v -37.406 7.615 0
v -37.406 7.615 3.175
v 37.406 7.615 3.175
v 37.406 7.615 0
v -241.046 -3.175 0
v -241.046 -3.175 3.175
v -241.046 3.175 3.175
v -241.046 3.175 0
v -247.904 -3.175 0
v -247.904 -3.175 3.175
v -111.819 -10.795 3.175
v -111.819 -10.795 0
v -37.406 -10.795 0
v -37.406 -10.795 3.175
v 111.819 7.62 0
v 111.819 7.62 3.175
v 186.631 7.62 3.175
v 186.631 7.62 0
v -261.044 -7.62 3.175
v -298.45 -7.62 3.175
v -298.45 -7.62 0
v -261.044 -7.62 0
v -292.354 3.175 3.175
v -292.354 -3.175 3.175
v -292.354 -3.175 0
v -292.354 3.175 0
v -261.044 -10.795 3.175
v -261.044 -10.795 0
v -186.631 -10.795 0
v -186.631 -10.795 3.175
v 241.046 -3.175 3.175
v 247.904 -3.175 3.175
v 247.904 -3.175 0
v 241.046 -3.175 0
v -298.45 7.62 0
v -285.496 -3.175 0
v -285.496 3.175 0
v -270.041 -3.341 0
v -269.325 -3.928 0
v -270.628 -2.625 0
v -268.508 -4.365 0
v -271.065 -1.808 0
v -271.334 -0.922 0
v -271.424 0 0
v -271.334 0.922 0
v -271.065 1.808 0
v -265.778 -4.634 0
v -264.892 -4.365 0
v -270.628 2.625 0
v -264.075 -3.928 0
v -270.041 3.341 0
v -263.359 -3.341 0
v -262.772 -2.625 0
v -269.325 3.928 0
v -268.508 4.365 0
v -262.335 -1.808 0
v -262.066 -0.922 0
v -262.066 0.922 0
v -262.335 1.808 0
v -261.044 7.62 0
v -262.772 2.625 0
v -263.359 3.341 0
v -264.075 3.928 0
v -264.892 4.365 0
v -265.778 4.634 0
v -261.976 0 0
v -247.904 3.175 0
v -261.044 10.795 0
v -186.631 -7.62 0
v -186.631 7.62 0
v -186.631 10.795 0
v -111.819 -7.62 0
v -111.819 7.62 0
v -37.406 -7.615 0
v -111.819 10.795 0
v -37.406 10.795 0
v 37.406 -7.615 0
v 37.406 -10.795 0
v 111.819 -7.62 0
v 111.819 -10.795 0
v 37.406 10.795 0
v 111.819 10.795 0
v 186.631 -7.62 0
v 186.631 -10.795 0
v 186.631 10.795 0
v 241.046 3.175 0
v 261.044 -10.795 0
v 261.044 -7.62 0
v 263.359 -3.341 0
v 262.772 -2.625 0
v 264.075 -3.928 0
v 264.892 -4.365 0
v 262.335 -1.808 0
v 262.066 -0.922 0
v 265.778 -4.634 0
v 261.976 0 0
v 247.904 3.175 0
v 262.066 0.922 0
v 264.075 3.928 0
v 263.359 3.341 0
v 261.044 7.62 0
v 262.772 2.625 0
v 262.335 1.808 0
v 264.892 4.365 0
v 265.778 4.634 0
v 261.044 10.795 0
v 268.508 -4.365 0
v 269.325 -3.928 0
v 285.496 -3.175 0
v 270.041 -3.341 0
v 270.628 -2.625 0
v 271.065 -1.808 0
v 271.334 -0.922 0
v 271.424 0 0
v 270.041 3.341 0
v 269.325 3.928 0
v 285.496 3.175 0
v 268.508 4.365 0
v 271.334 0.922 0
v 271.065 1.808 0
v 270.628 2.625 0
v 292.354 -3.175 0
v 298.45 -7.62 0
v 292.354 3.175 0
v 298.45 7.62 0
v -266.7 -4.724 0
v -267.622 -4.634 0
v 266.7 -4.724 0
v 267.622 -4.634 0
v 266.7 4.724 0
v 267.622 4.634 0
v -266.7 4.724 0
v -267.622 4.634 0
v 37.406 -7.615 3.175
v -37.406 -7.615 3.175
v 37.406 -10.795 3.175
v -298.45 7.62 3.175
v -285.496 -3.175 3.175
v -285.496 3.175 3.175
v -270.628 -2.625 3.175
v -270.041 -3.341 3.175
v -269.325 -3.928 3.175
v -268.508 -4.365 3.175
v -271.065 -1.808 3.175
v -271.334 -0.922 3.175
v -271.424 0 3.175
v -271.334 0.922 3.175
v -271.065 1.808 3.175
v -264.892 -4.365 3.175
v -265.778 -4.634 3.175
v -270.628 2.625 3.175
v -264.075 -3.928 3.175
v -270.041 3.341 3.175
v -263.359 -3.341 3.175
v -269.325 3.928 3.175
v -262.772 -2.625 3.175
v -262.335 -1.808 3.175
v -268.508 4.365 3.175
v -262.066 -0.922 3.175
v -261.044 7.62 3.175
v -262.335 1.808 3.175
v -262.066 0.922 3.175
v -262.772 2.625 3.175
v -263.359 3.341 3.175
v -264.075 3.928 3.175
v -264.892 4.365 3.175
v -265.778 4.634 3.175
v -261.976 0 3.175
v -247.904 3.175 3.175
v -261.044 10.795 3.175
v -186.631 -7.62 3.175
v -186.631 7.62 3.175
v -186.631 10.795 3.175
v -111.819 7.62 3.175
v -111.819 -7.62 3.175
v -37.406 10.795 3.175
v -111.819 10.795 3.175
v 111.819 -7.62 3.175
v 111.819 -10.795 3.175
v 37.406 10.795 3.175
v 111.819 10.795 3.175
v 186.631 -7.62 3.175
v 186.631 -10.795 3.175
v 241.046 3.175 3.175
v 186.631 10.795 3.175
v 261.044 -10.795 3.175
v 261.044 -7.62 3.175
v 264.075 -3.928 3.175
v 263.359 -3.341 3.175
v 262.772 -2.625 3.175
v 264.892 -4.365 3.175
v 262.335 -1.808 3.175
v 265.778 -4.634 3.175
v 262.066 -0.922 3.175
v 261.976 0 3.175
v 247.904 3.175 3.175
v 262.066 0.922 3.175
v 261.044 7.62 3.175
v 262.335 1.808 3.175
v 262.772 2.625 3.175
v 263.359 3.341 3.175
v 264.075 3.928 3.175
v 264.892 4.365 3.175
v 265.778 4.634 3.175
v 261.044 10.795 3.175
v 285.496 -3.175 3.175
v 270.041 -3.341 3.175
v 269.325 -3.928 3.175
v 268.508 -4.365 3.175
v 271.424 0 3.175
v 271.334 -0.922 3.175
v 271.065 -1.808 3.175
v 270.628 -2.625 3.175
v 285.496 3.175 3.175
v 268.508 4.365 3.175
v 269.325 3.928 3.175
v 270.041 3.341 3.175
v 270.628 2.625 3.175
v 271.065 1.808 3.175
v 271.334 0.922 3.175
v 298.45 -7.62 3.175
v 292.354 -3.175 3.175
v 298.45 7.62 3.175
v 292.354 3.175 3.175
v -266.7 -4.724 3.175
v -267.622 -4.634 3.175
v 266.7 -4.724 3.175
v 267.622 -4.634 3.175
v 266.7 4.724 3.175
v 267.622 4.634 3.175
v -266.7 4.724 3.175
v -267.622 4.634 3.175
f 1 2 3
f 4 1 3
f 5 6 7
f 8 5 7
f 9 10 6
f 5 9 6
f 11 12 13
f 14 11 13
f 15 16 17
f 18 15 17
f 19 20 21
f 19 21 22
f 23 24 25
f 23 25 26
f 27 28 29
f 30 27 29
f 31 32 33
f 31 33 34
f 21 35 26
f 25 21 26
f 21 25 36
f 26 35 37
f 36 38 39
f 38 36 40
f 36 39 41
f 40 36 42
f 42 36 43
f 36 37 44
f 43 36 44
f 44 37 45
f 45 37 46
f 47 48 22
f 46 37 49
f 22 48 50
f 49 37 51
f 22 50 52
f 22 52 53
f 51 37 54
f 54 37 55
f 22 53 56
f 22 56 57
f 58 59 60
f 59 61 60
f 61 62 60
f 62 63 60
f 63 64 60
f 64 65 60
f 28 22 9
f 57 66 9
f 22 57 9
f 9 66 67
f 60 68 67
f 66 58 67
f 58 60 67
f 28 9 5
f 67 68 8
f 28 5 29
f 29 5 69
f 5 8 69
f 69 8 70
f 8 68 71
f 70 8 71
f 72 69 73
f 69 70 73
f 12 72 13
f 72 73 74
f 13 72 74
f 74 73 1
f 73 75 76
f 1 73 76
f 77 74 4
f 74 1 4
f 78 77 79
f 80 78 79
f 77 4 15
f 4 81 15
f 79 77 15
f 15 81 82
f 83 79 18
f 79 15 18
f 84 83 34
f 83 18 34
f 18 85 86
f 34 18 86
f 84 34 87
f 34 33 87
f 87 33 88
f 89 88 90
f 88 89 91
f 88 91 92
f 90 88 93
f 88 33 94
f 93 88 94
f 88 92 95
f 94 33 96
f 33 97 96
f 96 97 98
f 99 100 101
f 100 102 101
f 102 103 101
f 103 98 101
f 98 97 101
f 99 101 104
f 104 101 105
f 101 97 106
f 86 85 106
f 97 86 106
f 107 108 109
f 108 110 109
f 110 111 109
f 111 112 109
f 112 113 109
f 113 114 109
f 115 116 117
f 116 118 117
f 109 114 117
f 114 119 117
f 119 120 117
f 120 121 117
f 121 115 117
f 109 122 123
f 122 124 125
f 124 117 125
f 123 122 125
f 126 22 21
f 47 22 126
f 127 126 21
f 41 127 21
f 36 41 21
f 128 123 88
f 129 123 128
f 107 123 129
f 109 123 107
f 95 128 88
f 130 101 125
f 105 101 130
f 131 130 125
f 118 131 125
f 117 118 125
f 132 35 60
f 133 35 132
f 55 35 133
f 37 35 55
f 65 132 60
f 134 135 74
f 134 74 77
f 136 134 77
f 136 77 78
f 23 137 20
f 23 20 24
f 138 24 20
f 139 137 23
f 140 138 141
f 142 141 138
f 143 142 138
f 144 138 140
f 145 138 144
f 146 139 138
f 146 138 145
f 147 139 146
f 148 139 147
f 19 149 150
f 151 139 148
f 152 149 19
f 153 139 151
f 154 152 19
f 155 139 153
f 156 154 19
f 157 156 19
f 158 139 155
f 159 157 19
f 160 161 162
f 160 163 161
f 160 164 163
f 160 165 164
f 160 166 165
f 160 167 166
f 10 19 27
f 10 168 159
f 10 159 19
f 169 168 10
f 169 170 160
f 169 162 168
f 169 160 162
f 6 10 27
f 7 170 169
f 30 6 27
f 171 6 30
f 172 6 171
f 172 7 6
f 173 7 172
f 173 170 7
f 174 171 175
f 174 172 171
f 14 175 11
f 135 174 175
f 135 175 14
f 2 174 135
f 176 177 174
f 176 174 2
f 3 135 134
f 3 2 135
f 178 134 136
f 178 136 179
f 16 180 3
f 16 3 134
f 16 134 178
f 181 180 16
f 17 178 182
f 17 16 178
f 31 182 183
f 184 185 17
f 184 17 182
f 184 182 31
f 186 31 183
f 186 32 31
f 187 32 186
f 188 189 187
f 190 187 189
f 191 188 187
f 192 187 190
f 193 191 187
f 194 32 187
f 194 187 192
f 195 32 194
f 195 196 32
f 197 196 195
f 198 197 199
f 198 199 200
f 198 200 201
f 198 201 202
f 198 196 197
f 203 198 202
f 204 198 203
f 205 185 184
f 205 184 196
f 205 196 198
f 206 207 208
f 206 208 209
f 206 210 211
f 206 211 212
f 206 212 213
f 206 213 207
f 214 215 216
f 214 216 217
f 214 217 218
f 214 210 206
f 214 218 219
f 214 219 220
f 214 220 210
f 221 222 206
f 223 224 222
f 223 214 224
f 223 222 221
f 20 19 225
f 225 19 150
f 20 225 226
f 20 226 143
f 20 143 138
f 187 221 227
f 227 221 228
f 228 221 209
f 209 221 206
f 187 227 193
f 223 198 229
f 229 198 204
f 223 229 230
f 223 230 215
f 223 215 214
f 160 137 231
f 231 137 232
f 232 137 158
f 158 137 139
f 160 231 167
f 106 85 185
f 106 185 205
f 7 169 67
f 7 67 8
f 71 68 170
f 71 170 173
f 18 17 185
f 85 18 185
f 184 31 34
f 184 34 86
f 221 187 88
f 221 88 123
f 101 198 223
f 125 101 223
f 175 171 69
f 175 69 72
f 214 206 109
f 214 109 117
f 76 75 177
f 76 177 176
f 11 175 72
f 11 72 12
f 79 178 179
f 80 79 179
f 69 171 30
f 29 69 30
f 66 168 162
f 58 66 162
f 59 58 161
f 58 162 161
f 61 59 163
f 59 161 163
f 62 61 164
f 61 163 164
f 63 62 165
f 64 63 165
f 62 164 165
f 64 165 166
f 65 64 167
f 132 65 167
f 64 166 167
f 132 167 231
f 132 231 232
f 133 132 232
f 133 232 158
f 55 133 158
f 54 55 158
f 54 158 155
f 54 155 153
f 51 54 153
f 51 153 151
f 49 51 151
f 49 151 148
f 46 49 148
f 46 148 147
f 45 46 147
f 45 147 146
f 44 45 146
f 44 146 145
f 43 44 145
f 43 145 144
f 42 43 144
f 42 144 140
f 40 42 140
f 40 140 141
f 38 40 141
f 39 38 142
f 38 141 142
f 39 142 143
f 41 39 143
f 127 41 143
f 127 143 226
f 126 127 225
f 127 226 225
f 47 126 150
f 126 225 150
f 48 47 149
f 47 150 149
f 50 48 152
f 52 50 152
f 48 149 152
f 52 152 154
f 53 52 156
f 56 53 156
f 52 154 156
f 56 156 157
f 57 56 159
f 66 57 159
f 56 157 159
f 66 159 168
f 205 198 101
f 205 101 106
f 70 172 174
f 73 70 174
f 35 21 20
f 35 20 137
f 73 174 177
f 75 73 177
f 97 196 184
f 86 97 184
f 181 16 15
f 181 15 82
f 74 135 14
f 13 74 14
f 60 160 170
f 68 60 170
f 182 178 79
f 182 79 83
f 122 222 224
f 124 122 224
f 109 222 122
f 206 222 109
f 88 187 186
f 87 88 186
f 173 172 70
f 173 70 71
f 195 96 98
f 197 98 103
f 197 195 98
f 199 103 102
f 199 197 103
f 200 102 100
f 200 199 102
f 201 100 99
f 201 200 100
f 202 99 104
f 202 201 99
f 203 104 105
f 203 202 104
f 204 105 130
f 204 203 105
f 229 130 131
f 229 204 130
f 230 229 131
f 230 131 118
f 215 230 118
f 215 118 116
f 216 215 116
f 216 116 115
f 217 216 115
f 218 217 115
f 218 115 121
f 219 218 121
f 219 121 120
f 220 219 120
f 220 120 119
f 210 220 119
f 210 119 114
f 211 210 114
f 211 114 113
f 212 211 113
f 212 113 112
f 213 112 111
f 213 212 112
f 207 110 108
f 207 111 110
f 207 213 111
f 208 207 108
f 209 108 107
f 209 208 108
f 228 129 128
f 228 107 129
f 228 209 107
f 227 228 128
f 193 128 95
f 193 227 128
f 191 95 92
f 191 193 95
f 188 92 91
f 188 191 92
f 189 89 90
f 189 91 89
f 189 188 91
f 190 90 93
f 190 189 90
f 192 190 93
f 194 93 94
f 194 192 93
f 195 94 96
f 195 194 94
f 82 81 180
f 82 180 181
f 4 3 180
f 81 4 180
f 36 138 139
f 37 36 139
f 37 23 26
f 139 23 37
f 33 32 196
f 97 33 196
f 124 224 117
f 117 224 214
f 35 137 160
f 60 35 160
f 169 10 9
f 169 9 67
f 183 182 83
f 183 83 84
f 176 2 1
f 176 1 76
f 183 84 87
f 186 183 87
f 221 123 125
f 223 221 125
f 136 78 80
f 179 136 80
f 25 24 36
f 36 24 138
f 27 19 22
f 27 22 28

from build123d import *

# Parameters (mm, degrees)
ESQUISSE1_W             = 596.9
ESQUISSE1_H             = 21.59
BOSS_EXTRU_1_DEPTH      = 3.175
ESQUISSE4_W             = 74.8125
ESQUISSE4_H             = 3.18
ESQUISSE4_H_2           = 3.175
ESQUISSE4_W_2           = 37.40625
ENL_V_MAT_EXTRU_3_DEPTH = 299.662041696
ESQUISSE5_R             = 4.7244
ESQUISSE5_W             = 6.858
ESQUISSE5_H             = 6.35
ENL_V_MAT_EXTRU_4_DEPTH = 299.662041696


with BuildPart() as part:
    # Esquisse1 → Boss.-Extru.1 (new body)
    with BuildSketch(Plane.XY):
        Rectangle(ESQUISSE1_W, ESQUISSE1_H)
    extrude(amount=BOSS_EXTRU_1_DEPTH)

    # Esquisse4 → Enlèv. mat.-Extru.3 (cut, through all)
    with BuildSketch(Plane.XY.offset(3.175)):
        with Locations((0, 9.205)):
            Rectangle(ESQUISSE4_W, ESQUISSE4_H)
        with Locations((-149.225, 9.2075)):
            Rectangle(ESQUISSE4_W, ESQUISSE4_H_2)
        with Locations((-279.746875, 9.2075)):
            Rectangle(ESQUISSE4_W_2, ESQUISSE4_H_2)
        with Locations((279.746875, 9.2075)):
            Rectangle(ESQUISSE4_W_2, ESQUISSE4_H_2)
        with Locations((149.225, 9.2075)):
            Rectangle(ESQUISSE4_W, ESQUISSE4_H_2)
    enl_v_mat_extru_3 = extrude(amount=-ENL_V_MAT_EXTRU_3_DEPTH, mode=Mode.SUBTRACT)

    # Symétrie3: Enlèv. mat.-Extru.3 across plane
    add(enl_v_mat_extru_3.mirror(Plane.ZX), mode=Mode.SUBTRACT)

    # Esquisse5 → Enlèv. mat.-Extru.4 (cut, through all)
    with BuildSketch(Plane.XY.offset(3.175)):
        with Locations((-266.7, 0)):
            Circle(ESQUISSE5_R)
        with Locations((-244.475, 0)):
            Rectangle(ESQUISSE5_W, ESQUISSE5_H)
        with Locations((-288.925, 0)):
            Rectangle(ESQUISSE5_W, ESQUISSE5_H)
    enl_v_mat_extru_4 = extrude(amount=-ENL_V_MAT_EXTRU_4_DEPTH, mode=Mode.SUBTRACT)

    # Symétrie4: Enlèv. mat.-Extru.4 across plane
    add(enl_v_mat_extru_4.mirror(Plane(origin=(0, 0, 0), x_dir=(0, 0, 1), z_dir=(1, 0, 0))), mode=Mode.SUBTRACT)


solid = part.part
